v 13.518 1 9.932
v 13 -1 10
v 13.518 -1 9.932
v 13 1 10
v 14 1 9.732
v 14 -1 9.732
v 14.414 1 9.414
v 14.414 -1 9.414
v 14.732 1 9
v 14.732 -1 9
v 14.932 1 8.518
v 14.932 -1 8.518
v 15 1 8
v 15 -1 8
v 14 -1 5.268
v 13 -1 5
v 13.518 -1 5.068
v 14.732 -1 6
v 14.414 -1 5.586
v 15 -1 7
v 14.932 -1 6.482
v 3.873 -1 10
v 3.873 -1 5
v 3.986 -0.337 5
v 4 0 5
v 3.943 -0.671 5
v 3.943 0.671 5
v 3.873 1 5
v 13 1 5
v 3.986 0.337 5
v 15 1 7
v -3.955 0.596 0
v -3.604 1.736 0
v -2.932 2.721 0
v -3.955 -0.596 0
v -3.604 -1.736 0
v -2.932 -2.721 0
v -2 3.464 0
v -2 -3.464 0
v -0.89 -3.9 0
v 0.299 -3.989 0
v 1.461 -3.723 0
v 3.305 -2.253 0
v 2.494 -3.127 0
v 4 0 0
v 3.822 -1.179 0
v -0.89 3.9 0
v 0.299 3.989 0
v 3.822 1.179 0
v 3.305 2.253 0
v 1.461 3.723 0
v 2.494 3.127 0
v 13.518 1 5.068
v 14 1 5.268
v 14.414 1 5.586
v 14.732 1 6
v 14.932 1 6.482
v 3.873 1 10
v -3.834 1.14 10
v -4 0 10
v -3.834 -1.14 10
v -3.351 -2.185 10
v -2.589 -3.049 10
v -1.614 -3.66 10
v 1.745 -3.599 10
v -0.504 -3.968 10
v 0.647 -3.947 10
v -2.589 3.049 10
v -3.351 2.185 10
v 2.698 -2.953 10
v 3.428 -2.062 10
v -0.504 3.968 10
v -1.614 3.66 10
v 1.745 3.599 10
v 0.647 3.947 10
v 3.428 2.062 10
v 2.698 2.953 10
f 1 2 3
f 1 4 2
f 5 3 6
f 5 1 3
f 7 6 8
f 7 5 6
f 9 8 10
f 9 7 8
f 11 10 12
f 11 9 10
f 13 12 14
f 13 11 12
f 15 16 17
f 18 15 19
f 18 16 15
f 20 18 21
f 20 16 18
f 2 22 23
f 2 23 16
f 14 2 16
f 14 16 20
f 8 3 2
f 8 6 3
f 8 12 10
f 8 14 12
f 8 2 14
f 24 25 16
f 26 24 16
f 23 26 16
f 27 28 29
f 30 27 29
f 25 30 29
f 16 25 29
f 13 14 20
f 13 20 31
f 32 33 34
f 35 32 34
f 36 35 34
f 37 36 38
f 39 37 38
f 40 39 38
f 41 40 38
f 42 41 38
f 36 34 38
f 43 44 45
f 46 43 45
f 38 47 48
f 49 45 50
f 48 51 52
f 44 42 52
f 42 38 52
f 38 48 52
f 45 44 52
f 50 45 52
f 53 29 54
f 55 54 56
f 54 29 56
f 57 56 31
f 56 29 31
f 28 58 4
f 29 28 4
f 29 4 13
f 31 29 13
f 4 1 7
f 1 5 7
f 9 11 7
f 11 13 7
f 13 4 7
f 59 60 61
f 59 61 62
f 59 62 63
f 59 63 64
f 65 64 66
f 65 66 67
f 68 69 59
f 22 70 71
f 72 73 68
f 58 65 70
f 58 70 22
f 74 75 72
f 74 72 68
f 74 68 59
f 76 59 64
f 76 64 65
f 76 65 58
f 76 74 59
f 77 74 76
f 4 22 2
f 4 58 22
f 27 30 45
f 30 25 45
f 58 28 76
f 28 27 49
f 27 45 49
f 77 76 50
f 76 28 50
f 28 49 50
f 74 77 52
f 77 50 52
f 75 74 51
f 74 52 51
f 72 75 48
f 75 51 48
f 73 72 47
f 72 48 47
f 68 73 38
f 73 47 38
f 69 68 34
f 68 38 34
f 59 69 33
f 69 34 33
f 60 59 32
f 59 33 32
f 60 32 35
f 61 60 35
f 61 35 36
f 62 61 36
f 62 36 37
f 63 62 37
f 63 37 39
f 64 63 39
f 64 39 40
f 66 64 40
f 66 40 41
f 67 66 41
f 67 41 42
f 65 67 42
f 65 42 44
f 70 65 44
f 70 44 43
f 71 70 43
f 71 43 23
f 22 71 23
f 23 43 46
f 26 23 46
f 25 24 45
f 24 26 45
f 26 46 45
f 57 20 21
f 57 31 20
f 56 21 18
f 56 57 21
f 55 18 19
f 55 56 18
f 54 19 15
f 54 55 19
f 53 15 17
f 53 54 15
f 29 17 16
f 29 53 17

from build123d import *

# Parameters (mm, degrees)
F0_R     = 4
F1_DEPTH = 10
F2_W     = 15
F2_H     = 2
F3_DEPTH = 5
F4_R     = 2


with BuildPart() as f1:
    # F0 (on Top) → F1 (new body)
    with BuildSketch(Plane.XY):
        Circle(F0_R)
    extrude(amount=F1_DEPTH)

    # F2 (on face) → F3 (join)
    with BuildSketch(Plane.XY.offset(10)):
        with Locations((7.5, 0)):
            Rectangle(F2_W, F2_H)
    extrude(amount=-F3_DEPTH)

    # F4
    f4_edges = [f1.edges().sort_by_distance(p)[0] for p in [
        (15, 0, 10),
        (15, 0, 5),
    ]]
    fillet(f4_edges, radius=F4_R)


solid = f1.part
